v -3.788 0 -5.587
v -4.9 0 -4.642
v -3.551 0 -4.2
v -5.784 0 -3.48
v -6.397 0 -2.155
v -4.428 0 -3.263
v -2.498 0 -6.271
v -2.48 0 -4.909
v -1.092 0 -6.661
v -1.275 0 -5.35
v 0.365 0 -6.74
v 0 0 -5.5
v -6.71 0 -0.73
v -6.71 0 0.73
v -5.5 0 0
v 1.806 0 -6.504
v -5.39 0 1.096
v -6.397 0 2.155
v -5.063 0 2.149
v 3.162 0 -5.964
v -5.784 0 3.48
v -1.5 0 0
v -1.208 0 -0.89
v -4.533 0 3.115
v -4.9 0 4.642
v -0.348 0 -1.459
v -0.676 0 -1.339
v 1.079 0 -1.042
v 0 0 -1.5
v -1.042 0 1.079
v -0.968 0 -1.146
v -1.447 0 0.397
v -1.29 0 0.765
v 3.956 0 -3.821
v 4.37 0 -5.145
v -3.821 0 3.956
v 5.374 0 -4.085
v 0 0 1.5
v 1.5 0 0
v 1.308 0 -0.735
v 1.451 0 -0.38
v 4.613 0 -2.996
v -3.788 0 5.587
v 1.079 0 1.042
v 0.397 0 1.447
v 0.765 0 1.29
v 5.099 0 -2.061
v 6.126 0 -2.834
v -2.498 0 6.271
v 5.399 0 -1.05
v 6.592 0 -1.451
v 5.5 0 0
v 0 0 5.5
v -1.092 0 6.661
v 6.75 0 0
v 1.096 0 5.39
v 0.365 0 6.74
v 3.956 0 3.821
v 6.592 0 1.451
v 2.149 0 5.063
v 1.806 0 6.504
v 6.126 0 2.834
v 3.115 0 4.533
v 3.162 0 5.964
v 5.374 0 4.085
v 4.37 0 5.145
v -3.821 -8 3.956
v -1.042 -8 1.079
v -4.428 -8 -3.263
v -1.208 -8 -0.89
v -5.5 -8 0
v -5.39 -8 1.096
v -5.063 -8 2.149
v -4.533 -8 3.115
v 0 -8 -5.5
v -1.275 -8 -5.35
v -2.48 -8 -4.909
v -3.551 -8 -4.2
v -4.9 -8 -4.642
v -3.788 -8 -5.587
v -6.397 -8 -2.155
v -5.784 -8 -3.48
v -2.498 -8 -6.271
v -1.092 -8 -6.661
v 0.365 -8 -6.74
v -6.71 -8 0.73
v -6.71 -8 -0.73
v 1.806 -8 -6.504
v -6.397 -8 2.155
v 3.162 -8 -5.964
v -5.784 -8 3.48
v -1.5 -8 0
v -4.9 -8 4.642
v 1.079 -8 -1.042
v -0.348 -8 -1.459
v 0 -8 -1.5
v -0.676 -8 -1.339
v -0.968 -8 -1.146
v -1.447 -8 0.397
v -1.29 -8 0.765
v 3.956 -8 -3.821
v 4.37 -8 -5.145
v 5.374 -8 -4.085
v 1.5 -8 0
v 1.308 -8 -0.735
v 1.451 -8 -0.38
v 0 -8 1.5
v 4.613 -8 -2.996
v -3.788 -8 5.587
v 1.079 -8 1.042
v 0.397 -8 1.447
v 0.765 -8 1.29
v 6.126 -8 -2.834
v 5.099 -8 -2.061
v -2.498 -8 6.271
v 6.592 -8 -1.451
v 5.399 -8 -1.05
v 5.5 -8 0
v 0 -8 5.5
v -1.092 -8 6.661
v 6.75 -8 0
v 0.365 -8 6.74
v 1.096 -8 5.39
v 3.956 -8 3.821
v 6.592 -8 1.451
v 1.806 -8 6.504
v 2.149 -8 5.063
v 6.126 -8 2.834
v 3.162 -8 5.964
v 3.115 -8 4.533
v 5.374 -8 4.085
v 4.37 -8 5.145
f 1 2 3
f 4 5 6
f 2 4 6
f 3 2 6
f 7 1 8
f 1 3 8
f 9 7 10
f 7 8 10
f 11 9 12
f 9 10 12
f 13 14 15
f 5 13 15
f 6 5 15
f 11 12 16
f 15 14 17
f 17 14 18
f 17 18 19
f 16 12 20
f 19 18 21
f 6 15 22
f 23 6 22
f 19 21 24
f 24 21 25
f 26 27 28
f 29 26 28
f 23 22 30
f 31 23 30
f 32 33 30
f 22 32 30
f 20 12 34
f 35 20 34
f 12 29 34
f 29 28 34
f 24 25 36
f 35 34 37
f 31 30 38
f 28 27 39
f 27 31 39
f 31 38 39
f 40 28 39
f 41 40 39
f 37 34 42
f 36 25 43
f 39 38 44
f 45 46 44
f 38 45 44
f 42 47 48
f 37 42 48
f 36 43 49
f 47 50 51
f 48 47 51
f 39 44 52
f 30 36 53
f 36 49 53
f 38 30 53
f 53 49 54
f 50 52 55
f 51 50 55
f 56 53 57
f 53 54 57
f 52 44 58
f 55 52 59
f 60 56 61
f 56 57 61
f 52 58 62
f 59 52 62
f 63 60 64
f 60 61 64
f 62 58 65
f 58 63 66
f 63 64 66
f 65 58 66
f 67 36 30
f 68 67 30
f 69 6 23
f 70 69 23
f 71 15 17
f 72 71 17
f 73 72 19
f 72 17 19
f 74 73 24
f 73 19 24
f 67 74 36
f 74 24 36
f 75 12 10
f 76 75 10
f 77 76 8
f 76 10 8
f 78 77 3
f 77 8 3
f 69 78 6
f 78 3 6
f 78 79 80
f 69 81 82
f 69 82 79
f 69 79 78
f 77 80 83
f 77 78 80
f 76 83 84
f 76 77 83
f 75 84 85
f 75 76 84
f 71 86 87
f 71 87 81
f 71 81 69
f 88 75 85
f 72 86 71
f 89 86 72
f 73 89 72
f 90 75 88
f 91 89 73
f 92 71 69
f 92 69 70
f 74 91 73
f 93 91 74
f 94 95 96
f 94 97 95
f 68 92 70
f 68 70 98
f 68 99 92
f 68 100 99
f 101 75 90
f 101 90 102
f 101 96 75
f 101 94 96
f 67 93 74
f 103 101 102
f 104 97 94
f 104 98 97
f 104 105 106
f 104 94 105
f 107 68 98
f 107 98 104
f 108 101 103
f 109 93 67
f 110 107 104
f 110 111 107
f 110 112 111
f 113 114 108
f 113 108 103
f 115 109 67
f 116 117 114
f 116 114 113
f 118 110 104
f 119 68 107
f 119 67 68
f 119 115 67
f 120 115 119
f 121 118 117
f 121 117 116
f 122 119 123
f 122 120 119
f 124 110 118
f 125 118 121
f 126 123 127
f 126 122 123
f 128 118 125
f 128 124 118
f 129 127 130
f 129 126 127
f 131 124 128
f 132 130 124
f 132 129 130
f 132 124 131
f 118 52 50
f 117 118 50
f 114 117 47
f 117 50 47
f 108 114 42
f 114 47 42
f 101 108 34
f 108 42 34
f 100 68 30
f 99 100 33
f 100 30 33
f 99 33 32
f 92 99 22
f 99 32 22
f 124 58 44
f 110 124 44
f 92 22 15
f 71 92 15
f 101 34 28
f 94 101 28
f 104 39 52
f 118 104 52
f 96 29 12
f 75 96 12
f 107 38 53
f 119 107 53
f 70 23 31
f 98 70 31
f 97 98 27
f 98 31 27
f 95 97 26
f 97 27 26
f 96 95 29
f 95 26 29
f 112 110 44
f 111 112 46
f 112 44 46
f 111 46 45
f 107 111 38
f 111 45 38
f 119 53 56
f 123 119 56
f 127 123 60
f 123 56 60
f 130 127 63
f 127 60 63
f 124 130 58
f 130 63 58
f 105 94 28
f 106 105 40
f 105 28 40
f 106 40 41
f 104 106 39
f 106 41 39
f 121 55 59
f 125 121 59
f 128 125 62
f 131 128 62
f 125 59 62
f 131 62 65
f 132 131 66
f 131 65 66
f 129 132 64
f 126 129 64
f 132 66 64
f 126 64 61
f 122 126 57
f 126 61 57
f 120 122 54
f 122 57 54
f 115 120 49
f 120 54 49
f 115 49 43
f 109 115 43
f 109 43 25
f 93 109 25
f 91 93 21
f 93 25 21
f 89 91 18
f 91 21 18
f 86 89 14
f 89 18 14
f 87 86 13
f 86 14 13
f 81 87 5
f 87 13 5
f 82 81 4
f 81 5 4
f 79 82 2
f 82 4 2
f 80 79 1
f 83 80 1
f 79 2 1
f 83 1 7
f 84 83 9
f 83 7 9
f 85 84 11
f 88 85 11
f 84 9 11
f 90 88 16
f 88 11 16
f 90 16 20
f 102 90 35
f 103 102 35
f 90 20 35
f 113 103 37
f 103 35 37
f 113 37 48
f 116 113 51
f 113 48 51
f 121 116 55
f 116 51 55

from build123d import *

# Parameters (mm, degrees)
F0_R     = 6.75
F1_DEPTH = 8
F3_DEPTH = 8.001
F4_DEPTH = 8.001


with BuildPart() as f1:
    # F0 (on Front) → F1 (new body)
    with BuildSketch(Plane.XZ):
        Circle(F0_R)
    extrude(amount=F1_DEPTH)

    # F2 (on face) → F3 (cut, through all)
    with BuildSketch(Plane(origin=(0, 0, 0), x_dir=(-1, 0, 0), z_dir=(0, 1, 0))):
        with BuildLine():
            Line((0, 1.5), (0, 5.5))
            ThreePointArc((0, 5.5), (-2.1488308702, 5.0628574828), (-3.9560816184, 3.8209185059))
            Line((-3.9560816184, 3.8209185059), (-1.0789313505, 1.0420686834))
            ThreePointArc((-1.0789313505, 1.0420686834), (-0.5860447828, 1.3807793135), (0, 1.5))
        make_face()
    extrude(amount=-F3_DEPTH, mode=Mode.SUBTRACT)

    # F2 (on face) → F4 (cut, through all)
    with BuildSketch(Plane(origin=(0, 0, 0), x_dir=(-1, 0, 0), z_dir=(0, 1, 0))):
        with BuildLine():
            Line((1.5, 0), (5.5, 0))
            ThreePointArc((5.5, 0), (5.0628574828, 2.1488308702), (3.8209185059, 3.9560816184))
            Line((3.8209185059, 3.9560816184), (1.0420686834, 1.0789313505))
            ThreePointArc((1.0420686834, 1.0789313505), (1.3807793135, 0.5860447828), (1.5, 0))
        make_face()
        with BuildLine():
            ThreePointArc((0, -5.5), (2.4803486414, -4.9089582008), (4.4276101105, -3.2628620427))
            Line((4.4276101105, -3.2628620427), (1.2075300301, -0.8898714662))
            ThreePointArc((1.2075300301, -0.8898714662), (0.6764587204, -1.338806782), (0, -1.5))
            Line((0, -1.5), (0, -5.5))
        make_face()
        with BuildLine():
            ThreePointArc((-5.5, 0), (-5.0994337382, -2.0605279783), (-3.9560816184, -3.8209185059))
            Line((-3.9560816184, -3.8209185059), (-1.0789313505, -1.0420686834))
            ThreePointArc((-1.0789313505, -1.0420686834), (-1.3907546559, -0.5619621759), (-1.5, 0))
            Line((-1.5, 0), (-5.5, 0))
        make_face()
        with BuildLine():
            Line((0, 1.5), (0, 5.5))
            ThreePointArc((0, 5.5), (-2.1488308702, 5.0628574828), (-3.9560816184, 3.8209185059))
            Line((-3.9560816184, 3.8209185059), (-1.0789313505, 1.0420686834))
            ThreePointArc((-1.0789313505, 1.0420686834), (-0.5860447828, 1.3807793135), (0, 1.5))
        make_face()
    extrude(amount=-F4_DEPTH, mode=Mode.SUBTRACT)


solid = f1.part
